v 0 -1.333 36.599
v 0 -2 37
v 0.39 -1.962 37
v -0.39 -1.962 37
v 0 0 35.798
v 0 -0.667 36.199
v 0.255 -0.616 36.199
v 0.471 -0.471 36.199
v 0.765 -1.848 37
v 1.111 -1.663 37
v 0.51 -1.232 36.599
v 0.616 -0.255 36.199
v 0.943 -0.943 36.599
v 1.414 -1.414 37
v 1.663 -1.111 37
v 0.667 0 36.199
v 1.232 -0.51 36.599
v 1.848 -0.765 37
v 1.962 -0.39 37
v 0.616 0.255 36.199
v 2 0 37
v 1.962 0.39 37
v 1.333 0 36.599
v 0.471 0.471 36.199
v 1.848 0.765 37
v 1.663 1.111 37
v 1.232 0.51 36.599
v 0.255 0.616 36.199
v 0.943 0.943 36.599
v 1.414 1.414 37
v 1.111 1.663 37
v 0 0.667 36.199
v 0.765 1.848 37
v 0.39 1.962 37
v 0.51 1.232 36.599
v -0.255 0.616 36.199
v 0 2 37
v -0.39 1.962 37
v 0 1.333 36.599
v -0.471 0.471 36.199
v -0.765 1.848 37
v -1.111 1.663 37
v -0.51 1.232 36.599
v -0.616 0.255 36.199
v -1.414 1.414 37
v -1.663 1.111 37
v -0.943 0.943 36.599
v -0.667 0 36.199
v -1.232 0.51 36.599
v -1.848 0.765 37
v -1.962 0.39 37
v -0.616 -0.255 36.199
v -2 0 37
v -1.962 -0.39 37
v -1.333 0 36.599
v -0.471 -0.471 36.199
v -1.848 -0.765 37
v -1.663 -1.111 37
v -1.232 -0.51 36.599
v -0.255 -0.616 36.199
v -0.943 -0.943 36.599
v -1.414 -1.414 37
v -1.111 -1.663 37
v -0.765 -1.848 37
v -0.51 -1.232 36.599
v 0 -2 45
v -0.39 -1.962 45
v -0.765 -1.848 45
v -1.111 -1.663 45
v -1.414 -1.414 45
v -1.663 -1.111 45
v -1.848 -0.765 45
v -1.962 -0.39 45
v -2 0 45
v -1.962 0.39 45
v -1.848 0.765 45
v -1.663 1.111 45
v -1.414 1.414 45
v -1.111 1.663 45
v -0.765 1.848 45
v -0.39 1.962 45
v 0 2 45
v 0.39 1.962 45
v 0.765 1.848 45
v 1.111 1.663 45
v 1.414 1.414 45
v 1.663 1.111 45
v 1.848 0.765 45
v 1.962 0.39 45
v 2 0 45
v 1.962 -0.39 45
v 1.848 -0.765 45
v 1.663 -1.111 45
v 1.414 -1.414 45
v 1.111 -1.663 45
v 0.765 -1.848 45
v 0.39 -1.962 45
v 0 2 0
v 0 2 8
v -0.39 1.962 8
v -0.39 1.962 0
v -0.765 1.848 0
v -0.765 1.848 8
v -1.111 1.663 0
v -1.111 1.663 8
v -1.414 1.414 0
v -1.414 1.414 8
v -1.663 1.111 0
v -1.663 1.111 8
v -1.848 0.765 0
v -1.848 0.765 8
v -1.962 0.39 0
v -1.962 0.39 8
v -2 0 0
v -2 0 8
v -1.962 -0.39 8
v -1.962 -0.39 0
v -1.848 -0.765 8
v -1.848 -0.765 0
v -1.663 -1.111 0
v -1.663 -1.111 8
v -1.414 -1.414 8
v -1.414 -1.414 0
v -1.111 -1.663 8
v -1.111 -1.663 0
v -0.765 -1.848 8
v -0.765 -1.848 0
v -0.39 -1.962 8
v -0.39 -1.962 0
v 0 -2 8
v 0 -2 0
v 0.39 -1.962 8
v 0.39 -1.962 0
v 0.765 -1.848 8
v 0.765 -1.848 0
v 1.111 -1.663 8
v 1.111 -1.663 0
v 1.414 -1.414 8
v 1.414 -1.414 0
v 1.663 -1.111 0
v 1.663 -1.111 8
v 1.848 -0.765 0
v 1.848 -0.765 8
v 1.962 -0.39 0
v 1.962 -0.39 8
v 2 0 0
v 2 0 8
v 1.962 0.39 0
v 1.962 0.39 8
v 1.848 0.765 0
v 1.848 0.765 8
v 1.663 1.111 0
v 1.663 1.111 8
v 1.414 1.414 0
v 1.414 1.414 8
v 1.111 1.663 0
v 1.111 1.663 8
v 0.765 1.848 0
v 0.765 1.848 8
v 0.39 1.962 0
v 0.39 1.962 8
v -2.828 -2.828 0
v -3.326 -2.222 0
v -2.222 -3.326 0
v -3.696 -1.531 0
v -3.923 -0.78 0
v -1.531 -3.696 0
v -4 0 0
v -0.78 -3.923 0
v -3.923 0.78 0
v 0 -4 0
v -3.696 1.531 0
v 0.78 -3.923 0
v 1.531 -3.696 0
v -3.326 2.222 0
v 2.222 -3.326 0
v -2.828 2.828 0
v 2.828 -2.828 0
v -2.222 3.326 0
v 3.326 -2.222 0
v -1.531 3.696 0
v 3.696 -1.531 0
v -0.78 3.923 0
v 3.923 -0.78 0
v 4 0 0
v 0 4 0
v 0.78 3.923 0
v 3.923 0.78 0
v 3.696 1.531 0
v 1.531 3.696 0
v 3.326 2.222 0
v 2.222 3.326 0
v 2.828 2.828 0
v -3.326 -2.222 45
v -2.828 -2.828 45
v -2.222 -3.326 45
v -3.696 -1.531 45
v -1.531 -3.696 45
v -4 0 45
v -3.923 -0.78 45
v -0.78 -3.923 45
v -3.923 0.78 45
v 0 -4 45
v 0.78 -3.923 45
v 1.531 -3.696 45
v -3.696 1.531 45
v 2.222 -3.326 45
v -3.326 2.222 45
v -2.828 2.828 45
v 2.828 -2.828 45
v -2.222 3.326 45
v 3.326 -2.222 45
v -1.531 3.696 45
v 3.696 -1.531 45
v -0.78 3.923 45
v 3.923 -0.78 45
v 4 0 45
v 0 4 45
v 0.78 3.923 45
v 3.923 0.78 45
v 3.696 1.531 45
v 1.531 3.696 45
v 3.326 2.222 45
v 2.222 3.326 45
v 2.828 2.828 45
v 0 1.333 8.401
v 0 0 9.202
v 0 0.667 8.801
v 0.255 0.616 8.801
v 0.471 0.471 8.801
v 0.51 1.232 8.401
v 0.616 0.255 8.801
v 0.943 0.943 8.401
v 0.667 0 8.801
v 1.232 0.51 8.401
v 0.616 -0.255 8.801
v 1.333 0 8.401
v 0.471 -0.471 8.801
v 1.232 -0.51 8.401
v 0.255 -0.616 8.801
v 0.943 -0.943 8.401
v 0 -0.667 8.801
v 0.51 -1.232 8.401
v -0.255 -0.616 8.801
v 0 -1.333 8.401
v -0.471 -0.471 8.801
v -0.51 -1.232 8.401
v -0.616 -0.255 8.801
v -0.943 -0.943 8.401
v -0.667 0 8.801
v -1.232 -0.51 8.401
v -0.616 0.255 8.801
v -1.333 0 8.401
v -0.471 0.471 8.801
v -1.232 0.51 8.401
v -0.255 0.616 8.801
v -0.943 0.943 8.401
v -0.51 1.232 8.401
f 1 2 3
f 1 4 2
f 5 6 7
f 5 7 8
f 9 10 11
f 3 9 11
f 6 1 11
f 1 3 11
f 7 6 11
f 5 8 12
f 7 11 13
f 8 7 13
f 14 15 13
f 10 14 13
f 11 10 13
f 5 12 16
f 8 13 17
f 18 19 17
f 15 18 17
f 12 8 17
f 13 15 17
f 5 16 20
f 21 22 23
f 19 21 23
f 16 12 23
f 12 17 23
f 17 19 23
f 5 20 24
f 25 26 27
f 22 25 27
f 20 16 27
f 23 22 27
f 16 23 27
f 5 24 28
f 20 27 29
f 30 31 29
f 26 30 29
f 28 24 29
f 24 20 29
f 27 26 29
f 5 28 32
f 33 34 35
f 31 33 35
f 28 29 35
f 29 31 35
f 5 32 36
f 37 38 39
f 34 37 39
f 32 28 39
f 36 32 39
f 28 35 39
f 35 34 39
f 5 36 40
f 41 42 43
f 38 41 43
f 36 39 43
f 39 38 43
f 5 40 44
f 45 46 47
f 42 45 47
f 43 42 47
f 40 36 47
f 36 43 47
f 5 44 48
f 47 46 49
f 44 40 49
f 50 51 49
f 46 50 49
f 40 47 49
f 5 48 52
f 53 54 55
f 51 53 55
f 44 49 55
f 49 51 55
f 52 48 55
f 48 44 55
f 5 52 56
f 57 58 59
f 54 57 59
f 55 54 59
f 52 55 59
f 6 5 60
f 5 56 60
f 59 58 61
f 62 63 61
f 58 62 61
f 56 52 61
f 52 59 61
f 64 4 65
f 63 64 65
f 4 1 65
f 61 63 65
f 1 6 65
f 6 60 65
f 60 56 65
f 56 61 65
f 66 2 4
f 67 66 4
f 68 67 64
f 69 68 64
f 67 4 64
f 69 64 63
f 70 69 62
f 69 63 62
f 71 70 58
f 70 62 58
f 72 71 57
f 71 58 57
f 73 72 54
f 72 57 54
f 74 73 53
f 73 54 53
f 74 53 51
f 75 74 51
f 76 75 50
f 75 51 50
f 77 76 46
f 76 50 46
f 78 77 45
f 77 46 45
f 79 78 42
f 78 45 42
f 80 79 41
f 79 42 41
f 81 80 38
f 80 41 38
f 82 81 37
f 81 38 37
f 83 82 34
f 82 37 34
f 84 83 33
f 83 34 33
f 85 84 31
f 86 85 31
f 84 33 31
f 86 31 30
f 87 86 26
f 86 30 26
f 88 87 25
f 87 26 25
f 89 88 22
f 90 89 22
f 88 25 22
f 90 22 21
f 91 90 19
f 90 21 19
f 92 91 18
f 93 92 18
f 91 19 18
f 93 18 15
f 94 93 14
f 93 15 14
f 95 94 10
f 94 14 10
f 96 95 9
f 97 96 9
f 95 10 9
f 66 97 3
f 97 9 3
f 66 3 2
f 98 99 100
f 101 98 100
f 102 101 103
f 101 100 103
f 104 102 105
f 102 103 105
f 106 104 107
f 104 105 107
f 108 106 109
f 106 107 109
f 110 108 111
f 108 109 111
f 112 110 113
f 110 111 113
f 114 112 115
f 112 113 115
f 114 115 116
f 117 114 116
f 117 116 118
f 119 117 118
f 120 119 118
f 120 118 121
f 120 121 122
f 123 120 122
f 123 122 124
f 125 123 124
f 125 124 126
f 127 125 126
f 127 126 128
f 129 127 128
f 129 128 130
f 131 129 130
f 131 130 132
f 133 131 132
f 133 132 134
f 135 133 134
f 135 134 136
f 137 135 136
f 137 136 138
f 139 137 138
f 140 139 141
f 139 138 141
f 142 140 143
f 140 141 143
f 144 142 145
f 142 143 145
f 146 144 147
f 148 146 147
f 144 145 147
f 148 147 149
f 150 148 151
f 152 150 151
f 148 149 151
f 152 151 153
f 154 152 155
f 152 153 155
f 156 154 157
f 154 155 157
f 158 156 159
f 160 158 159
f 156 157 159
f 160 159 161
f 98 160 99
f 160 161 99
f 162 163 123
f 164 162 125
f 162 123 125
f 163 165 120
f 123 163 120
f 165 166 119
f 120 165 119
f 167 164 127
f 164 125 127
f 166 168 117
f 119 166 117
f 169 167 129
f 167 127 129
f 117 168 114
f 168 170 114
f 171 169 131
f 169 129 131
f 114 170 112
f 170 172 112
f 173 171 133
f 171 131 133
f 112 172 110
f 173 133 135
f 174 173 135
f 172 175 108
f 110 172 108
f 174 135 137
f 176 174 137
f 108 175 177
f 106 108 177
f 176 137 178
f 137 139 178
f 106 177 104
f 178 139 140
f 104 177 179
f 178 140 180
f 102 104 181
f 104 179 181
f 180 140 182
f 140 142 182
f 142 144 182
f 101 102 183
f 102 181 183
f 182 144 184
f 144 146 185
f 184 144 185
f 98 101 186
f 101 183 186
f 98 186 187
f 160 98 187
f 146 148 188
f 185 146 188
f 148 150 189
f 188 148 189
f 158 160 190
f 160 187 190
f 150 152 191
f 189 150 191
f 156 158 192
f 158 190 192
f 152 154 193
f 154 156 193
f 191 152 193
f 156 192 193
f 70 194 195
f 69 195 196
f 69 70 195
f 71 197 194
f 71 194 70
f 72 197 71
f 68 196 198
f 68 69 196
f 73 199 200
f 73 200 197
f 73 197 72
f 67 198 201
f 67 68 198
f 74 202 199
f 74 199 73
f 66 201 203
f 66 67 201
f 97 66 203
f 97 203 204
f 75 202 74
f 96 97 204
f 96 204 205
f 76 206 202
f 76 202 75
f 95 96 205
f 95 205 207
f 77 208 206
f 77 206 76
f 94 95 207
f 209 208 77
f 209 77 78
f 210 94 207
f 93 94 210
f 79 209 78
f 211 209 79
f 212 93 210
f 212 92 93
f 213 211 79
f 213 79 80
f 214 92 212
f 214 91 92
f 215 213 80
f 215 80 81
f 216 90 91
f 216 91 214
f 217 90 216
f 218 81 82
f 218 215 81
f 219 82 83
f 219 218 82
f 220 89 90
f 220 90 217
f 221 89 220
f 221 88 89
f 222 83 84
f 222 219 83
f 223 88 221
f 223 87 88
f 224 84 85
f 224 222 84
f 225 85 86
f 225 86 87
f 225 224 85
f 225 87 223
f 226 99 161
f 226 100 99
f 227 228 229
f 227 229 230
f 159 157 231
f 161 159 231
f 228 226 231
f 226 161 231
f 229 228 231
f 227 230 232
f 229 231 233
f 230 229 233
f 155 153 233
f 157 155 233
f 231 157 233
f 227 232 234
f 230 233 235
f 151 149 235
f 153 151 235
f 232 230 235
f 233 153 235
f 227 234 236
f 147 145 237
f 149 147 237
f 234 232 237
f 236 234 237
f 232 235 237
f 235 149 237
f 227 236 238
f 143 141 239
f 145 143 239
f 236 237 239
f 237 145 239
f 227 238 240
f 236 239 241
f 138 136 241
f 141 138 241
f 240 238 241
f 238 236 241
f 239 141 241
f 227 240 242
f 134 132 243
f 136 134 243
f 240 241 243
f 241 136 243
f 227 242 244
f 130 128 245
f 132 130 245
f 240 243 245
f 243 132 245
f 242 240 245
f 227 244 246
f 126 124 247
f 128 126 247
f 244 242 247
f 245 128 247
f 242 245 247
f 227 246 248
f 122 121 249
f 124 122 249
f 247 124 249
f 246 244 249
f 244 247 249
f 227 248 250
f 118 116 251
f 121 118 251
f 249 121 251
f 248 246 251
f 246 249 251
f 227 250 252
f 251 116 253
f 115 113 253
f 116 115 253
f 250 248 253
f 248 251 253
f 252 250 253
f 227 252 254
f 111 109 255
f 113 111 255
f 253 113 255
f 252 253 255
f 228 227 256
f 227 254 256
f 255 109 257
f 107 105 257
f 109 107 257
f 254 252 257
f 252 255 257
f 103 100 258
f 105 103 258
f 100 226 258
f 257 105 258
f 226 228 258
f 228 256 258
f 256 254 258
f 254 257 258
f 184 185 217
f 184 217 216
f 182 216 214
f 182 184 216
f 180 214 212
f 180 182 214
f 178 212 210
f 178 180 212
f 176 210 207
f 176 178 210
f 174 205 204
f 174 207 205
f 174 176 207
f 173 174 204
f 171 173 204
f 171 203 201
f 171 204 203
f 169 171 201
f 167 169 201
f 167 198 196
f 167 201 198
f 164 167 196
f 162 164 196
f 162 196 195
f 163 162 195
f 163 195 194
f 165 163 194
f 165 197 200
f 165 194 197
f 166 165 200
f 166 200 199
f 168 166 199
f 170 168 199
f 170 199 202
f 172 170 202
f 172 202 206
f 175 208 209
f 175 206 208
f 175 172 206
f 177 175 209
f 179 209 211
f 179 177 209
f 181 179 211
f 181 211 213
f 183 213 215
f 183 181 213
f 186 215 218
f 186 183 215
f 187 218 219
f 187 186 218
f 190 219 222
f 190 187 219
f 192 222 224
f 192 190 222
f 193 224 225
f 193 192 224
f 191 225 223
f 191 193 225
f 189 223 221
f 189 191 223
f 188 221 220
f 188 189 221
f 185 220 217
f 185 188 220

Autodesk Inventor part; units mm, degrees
ref_plane "YZ Plane" through (0, 0, 0) normal (1, 0, 0) x (0, 1, 0)
ref_plane "XZ Plane" through (0, 0, 0) normal (0, 1, 0) x (-1, 0, 0)
ref_plane "XY Plane" through (0, 0, 0) normal (0, 0, 1) x (1, 0, 0)
sketch "スケッチ1" plane through (0, 0, 0) normal (0, 0, 1) x (1, 0, 0)
  circle A0 centre (0, 0) radius 4
  dimension "d0" = 8
extrude "押し出し1" add sketch "スケッチ1" along normal blind 45
hole "穴1" at (0, 0, 0) direction (0, 0, 1) diameter 4 depth 8 tip angle 118
sketch "スケッチ2" plane through (0, 0, 45) normal (0, 0, 1) x (1, 0, 0)
  point P0 (0, 0)
  point P1 (0, 0)
hole "穴2" at (0, 0, 45) direction (0, 0, -1) diameter 4 depth 8 tip angle 118
properties part number "スペーサ　m4-l45" material "アルミニウム 2014-T4"
